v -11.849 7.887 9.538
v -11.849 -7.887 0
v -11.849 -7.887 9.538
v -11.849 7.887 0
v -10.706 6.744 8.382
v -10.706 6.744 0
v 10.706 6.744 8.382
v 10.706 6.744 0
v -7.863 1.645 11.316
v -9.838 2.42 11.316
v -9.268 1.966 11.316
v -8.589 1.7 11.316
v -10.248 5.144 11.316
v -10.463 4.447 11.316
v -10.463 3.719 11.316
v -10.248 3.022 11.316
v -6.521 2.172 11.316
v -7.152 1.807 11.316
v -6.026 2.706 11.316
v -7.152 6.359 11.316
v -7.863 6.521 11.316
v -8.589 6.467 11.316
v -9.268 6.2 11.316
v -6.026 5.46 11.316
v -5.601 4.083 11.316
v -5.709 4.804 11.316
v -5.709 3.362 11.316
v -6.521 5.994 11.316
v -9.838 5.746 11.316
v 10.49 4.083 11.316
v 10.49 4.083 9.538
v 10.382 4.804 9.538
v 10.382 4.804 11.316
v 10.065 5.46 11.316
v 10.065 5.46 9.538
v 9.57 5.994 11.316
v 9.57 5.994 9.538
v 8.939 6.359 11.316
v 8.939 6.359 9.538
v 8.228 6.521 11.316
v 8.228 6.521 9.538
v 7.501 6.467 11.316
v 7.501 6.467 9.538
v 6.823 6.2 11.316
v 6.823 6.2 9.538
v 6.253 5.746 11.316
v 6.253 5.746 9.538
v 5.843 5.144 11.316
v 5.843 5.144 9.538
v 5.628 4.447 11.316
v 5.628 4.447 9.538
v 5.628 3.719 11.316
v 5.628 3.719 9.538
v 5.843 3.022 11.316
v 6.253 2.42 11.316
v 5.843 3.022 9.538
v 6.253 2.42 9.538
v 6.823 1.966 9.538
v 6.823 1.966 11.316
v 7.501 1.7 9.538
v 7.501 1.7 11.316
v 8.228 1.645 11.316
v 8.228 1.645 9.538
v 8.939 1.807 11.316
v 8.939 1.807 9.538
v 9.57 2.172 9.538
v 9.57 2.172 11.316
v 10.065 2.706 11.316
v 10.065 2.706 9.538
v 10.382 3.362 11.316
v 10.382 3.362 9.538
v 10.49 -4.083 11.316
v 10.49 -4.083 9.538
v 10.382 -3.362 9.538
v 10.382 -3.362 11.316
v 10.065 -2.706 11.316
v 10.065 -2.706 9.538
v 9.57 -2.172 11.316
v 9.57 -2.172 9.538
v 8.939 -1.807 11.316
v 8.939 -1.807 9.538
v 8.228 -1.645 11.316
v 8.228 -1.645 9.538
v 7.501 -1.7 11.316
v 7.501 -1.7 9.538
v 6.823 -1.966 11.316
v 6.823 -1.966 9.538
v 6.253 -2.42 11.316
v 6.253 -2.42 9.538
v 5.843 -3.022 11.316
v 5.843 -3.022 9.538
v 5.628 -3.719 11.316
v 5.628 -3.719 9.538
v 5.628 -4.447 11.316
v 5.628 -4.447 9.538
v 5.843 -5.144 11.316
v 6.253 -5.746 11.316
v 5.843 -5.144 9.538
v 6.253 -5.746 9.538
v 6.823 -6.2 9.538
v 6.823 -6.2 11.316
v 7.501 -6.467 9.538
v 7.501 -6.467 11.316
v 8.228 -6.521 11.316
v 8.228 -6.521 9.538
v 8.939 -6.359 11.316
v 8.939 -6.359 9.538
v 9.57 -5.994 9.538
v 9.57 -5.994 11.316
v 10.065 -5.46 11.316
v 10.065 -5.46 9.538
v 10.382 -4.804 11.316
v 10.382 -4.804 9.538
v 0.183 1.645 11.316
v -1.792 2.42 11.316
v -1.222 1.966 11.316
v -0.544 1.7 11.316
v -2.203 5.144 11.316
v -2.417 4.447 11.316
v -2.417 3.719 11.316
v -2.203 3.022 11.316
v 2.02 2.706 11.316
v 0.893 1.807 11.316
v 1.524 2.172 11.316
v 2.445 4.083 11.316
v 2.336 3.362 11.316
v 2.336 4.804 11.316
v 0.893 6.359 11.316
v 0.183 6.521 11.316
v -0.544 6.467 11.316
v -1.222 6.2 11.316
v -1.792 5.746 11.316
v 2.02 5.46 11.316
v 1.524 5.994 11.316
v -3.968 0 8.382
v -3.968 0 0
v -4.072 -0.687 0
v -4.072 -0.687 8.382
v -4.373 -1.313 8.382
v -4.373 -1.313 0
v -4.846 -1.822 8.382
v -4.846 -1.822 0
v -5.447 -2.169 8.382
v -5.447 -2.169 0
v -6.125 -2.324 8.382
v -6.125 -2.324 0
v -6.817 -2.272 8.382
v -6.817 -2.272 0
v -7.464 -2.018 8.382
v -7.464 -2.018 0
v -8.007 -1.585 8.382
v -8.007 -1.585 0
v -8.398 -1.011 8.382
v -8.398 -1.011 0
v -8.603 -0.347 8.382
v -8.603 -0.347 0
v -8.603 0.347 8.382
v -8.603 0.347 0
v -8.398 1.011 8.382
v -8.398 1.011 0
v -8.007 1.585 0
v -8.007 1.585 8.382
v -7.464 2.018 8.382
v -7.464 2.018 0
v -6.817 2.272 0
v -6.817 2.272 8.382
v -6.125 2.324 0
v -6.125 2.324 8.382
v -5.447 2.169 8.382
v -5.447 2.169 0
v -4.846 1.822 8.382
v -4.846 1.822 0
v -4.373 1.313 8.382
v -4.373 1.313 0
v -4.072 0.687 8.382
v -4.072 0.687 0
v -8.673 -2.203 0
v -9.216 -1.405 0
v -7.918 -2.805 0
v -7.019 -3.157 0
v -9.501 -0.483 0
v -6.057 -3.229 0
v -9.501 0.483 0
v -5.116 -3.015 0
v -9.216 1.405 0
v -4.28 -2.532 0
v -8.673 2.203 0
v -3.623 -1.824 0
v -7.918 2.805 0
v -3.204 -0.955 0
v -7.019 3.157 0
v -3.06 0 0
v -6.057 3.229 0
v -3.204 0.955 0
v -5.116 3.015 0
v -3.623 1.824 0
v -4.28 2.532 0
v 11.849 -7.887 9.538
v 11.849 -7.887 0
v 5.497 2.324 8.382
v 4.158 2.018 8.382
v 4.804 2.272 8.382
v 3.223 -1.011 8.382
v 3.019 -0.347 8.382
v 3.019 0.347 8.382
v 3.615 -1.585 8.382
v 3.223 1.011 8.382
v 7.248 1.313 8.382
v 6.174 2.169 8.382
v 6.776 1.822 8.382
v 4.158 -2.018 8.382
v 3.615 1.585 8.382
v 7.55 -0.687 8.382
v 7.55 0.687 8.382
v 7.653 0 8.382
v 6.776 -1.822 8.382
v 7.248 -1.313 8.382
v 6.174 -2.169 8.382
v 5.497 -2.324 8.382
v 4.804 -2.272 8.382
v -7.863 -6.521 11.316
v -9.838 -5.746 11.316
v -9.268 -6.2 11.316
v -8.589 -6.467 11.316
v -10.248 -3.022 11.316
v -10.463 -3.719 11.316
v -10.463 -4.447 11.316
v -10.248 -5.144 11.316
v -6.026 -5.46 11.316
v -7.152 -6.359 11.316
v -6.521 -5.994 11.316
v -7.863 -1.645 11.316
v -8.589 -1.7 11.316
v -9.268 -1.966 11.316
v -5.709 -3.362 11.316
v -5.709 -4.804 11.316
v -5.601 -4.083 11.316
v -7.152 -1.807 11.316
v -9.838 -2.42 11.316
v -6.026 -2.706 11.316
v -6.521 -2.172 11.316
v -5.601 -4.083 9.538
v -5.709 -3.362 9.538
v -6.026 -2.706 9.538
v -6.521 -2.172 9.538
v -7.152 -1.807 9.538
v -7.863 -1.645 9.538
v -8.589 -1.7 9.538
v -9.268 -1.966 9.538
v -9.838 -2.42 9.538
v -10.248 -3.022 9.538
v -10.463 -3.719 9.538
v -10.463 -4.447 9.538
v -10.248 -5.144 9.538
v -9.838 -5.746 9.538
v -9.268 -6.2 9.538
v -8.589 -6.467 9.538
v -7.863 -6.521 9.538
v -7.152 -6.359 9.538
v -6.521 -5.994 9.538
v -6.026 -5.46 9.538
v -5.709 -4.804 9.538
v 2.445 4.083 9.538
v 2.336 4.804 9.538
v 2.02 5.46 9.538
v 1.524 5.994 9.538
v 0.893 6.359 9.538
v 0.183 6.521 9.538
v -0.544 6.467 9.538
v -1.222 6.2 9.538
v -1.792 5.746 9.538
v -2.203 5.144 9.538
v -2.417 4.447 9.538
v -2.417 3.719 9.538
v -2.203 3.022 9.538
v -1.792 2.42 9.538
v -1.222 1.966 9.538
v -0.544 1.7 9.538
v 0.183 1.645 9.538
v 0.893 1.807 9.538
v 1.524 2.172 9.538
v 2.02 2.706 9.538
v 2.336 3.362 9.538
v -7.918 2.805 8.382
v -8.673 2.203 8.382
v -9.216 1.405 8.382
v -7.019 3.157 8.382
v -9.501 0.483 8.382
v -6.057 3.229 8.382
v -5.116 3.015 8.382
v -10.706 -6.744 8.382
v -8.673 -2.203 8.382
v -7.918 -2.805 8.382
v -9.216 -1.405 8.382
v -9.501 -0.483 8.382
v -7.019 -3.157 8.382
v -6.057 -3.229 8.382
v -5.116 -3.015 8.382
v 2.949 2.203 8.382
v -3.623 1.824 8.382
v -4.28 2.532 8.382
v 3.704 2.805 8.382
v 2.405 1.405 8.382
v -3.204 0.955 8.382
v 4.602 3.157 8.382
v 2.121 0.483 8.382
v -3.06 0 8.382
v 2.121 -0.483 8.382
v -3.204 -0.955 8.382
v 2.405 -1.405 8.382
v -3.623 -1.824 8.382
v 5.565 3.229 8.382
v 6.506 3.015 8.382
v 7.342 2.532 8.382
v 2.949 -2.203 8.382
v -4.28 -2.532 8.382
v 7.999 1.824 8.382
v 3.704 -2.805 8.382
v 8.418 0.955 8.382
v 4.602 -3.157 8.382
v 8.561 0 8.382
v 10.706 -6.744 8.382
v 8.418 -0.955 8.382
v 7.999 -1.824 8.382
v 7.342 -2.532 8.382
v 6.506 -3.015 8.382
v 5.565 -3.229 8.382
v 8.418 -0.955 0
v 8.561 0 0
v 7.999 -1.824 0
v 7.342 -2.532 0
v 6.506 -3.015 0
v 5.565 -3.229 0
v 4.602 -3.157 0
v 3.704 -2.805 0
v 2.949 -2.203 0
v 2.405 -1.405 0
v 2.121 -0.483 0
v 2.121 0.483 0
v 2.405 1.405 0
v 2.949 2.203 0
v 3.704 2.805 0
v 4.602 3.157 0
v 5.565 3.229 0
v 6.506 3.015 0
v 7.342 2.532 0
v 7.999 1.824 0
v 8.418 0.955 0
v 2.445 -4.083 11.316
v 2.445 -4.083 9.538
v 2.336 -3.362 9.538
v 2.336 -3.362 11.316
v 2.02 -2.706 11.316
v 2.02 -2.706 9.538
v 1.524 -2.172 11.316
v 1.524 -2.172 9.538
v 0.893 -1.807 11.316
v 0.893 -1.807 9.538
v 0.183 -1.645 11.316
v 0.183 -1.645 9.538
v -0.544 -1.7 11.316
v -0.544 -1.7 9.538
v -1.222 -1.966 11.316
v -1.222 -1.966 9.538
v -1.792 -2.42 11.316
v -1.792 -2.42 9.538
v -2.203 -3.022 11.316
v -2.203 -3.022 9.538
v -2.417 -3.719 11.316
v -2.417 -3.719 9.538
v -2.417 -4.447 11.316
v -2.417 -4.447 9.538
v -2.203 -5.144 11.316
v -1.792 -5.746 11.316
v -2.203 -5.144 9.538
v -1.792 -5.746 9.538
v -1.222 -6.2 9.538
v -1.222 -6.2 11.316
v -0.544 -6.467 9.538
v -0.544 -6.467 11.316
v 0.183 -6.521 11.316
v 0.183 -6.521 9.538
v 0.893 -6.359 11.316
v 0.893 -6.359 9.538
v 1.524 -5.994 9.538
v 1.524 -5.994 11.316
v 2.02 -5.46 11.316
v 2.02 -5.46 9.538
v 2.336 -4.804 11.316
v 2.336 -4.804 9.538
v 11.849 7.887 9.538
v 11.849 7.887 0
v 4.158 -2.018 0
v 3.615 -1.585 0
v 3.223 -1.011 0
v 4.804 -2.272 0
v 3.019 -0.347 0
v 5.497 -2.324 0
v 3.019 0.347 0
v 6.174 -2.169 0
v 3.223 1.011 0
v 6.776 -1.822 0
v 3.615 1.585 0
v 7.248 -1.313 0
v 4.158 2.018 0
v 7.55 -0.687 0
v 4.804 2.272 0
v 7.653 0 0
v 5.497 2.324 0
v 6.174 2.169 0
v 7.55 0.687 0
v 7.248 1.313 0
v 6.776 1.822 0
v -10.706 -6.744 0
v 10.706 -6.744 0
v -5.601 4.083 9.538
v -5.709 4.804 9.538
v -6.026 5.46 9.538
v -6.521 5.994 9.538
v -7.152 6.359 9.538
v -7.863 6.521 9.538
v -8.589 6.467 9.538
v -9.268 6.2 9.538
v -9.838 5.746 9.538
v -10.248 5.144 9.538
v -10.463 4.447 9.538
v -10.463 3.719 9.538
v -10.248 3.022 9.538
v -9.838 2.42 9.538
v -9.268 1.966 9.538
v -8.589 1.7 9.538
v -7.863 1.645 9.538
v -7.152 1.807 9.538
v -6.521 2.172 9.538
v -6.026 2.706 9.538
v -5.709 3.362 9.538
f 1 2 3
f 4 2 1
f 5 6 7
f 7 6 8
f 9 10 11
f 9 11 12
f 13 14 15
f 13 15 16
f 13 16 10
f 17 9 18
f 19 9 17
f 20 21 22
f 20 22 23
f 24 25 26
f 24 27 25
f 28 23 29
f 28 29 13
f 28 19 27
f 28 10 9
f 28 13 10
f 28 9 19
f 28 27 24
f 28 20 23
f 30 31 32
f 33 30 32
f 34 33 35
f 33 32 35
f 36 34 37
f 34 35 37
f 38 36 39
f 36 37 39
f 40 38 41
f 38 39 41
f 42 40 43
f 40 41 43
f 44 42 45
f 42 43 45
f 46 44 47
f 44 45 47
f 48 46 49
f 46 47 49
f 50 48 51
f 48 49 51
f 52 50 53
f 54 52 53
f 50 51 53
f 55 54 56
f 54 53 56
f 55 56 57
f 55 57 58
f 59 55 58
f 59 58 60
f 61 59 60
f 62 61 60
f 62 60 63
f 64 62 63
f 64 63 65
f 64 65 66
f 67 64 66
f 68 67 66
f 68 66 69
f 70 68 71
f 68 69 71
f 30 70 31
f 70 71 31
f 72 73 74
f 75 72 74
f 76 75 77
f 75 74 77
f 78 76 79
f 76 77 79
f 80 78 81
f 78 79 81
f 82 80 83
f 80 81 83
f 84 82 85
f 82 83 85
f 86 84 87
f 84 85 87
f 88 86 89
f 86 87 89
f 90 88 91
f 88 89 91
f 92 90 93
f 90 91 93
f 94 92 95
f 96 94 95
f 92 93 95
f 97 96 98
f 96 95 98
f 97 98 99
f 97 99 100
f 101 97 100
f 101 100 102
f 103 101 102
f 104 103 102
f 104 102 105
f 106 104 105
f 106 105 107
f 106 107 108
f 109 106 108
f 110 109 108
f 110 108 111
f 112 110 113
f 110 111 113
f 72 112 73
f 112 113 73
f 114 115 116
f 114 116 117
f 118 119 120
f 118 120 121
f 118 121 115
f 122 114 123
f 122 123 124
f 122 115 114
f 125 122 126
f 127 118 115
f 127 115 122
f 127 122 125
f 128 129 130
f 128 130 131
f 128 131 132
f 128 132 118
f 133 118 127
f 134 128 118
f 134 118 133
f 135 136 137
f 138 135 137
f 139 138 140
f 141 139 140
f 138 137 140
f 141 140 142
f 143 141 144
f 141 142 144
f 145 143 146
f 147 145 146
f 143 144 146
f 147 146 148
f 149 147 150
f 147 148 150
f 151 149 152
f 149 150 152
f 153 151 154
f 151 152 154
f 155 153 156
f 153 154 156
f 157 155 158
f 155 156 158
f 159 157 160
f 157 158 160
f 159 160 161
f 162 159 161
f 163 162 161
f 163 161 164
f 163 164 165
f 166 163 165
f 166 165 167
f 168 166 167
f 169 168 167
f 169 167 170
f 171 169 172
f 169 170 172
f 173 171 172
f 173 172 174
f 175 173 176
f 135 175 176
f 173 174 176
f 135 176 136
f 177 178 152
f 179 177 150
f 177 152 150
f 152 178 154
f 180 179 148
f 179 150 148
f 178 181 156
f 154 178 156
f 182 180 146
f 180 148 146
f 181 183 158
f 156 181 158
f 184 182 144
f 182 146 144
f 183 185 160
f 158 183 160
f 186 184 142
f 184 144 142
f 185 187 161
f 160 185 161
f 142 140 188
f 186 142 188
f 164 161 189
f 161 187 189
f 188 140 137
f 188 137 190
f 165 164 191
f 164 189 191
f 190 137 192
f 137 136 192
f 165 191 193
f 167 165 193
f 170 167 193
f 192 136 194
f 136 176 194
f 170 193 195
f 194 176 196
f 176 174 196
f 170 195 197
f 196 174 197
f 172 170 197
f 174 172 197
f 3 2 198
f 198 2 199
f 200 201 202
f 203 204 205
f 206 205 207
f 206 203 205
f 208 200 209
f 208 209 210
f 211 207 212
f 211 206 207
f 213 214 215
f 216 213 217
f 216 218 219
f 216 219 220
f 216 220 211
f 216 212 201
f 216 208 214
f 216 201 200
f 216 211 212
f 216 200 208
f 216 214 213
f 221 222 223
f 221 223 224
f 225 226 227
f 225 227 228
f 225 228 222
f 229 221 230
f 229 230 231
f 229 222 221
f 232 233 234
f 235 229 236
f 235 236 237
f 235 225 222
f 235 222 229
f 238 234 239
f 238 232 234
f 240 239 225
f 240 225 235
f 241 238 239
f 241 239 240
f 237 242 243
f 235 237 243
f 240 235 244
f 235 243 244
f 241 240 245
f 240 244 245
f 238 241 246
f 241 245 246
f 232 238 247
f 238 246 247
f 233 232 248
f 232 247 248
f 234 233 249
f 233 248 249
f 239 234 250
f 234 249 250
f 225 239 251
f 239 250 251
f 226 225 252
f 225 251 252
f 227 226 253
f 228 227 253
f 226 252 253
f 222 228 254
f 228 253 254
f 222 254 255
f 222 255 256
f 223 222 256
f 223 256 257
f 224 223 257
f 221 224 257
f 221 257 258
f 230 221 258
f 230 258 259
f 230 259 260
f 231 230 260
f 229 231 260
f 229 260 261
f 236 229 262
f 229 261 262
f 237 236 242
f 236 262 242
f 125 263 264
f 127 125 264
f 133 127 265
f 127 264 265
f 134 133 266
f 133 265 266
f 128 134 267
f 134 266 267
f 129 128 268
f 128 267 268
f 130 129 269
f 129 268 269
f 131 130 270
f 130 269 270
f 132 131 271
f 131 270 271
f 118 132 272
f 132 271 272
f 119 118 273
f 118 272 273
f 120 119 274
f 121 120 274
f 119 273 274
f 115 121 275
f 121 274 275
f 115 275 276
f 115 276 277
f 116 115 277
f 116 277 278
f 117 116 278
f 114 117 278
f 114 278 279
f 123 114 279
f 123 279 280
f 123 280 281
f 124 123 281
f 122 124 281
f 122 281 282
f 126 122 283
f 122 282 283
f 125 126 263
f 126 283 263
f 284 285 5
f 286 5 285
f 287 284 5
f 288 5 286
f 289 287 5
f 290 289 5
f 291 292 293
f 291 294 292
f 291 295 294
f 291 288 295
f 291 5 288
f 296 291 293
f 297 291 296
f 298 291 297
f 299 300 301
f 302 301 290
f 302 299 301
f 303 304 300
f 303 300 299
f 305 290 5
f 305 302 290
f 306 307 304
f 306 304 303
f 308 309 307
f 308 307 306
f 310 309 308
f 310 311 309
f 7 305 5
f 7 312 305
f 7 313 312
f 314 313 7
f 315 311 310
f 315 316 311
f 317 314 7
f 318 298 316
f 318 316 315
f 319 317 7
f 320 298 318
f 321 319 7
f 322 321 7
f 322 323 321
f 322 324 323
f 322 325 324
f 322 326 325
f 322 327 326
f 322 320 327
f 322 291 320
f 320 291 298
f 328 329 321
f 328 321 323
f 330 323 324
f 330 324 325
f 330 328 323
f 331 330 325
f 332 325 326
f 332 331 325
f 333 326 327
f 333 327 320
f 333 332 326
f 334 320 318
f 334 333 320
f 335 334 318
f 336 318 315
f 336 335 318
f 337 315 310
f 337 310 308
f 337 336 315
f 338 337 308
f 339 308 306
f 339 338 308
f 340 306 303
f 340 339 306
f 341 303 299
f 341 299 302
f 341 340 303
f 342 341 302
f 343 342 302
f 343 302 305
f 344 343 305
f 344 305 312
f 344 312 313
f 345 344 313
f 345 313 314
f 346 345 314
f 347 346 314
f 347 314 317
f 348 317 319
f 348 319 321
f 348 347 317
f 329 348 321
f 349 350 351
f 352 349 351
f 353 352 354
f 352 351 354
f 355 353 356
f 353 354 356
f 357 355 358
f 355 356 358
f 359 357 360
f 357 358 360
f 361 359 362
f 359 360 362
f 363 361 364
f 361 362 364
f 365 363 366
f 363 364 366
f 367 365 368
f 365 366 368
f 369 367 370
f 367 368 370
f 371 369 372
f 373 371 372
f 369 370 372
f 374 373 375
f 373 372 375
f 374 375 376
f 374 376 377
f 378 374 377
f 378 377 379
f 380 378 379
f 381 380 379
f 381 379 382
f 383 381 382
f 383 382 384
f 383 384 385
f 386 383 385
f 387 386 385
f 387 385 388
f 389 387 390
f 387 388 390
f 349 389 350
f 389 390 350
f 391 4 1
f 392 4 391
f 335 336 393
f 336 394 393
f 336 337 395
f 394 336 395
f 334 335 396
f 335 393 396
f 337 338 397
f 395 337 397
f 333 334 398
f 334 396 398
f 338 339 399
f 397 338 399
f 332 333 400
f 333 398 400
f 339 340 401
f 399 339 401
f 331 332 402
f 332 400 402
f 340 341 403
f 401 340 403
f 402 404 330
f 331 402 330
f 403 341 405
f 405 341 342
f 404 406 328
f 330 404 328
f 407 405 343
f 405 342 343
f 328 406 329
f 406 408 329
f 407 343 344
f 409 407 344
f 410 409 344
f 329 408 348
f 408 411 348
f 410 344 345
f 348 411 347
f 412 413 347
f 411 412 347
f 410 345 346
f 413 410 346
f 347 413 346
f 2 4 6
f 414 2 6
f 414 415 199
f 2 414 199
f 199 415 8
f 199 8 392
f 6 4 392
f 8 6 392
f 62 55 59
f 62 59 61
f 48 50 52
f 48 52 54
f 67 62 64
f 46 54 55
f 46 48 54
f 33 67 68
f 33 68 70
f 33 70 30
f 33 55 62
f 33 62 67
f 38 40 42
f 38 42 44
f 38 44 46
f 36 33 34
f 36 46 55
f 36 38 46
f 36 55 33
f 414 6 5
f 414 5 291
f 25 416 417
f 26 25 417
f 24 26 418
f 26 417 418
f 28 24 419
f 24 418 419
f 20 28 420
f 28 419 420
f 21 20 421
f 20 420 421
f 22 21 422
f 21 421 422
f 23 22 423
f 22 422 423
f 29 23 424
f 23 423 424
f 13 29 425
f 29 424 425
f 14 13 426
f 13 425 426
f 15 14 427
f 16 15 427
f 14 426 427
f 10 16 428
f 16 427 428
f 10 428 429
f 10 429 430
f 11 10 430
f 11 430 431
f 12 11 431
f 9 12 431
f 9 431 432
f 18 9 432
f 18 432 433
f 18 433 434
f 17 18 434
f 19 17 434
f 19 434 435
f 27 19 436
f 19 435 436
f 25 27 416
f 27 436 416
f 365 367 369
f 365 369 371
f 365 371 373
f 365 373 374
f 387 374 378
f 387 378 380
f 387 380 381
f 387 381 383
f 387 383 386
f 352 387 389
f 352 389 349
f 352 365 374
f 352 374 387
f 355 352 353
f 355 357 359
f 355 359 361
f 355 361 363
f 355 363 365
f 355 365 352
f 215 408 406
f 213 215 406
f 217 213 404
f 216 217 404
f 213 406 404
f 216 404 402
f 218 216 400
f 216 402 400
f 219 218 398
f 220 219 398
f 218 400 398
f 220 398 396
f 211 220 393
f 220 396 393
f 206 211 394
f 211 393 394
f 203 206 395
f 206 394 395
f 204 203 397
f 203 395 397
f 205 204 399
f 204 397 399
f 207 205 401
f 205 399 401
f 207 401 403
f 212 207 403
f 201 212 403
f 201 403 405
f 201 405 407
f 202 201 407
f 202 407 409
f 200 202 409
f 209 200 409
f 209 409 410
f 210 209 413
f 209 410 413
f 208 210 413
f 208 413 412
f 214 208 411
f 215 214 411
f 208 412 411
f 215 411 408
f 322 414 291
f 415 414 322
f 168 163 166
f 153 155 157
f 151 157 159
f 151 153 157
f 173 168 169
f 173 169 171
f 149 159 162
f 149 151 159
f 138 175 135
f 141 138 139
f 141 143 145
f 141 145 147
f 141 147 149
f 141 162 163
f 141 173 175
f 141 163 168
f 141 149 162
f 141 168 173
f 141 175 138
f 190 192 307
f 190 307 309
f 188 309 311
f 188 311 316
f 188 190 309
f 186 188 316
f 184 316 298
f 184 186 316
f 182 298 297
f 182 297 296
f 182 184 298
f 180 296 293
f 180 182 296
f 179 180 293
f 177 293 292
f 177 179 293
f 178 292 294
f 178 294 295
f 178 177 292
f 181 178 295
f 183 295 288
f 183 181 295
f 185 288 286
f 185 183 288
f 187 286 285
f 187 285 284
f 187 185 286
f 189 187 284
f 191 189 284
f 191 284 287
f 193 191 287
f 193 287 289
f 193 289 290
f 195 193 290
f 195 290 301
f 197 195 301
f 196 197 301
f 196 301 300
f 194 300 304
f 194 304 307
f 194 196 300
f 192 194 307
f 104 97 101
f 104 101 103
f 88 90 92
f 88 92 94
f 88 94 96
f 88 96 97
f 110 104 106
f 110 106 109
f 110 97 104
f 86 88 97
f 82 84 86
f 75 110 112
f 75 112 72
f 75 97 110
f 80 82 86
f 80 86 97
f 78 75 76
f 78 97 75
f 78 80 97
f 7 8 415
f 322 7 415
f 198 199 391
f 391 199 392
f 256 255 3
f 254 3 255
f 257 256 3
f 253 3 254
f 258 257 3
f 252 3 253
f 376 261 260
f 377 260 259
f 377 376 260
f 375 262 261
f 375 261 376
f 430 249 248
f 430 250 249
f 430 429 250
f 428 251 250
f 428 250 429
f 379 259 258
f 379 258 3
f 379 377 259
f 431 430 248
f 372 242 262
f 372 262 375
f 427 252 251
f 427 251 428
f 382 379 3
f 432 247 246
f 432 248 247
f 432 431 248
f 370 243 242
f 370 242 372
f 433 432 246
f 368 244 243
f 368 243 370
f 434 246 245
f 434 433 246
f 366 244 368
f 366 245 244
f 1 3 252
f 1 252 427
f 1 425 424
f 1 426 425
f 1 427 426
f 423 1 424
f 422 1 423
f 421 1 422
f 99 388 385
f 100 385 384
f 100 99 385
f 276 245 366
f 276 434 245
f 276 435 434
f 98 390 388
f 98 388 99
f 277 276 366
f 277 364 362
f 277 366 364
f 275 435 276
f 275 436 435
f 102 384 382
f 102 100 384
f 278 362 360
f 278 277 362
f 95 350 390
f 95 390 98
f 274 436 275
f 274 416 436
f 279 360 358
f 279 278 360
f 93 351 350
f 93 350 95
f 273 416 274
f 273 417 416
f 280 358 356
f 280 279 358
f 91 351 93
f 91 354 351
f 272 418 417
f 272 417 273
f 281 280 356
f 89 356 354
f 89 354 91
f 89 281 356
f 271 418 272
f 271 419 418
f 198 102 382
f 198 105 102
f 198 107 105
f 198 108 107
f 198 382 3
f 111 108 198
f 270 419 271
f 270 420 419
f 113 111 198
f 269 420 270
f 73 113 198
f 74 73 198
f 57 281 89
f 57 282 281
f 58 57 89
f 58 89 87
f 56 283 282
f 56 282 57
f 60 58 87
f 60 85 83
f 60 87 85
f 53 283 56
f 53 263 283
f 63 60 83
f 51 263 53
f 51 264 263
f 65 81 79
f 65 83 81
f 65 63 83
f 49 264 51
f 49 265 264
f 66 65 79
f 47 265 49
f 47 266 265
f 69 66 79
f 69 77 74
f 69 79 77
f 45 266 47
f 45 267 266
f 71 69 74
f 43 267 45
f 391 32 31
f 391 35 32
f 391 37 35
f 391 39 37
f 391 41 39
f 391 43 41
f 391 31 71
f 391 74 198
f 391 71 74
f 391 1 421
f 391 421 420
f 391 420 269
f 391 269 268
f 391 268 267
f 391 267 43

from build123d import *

# Parameters (mm, degrees)
F0_W     = 23.6982
F0_H     = 15.7734
F1_DEPTH = 9.5377
F2_R     = 2.44475
F3_DEPTH = 1.778
F4_W     = 21.4122
F4_H     = 13.4874
F4_R     = 3.2385
F5_DEPTH = 8.382
F4_R_2   = 2.33045
F6_DEPTH = 8.382


with BuildPart() as f1:
    # F0 (on Top) → F1 (new body)
    with BuildSketch(Plane.XY):
        Rectangle(F0_W, F0_H)
    extrude(amount=F1_DEPTH)

    # F2 (on face) → F3 (join)
    with BuildSketch(Plane.XY.offset(9.5377)):
        with Locations((-8.04545, -4.08305)):
            Circle(F2_R)
        with Locations((0, -4.08305)):
            Circle(F2_R)
        with Locations((8.04545, -4.08305)):
            Circle(F2_R)
        with Locations((8.04545, 4.08305)):
            Circle(F2_R)
        with Locations((0, 4.08305)):
            Circle(F2_R)
        with Locations((-8.04545, 4.08305)):
            Circle(F2_R)
    extrude(amount=F3_DEPTH)

    # F4 (on face) → F5 (cut)
    with BuildSketch(Plane(origin=(0, 0, 0), x_dir=(1, 0, 0), z_dir=(0, 0, -1))):
        Rectangle(F4_W, F4_H)
        with Locations((-6.298674, 0)):
            Circle(F4_R, mode=Mode.SUBTRACT)
        with Locations((5.322928, 0)):
            Circle(F4_R, mode=Mode.SUBTRACT)
    extrude(amount=-F5_DEPTH, mode=Mode.SUBTRACT)

    # F4 (on face) → F6 (cut)
    with BuildSketch(Plane(origin=(0, 0, 0), x_dir=(1, 0, 0), z_dir=(0, 0, -1))):
        with Locations((-6.298674, 0)):
            Circle(F4_R_2)
        with Locations((5.322928, 0)):
            Circle(F4_R_2)
    extrude(amount=-F6_DEPTH, mode=Mode.SUBTRACT)


solid = f1.part
